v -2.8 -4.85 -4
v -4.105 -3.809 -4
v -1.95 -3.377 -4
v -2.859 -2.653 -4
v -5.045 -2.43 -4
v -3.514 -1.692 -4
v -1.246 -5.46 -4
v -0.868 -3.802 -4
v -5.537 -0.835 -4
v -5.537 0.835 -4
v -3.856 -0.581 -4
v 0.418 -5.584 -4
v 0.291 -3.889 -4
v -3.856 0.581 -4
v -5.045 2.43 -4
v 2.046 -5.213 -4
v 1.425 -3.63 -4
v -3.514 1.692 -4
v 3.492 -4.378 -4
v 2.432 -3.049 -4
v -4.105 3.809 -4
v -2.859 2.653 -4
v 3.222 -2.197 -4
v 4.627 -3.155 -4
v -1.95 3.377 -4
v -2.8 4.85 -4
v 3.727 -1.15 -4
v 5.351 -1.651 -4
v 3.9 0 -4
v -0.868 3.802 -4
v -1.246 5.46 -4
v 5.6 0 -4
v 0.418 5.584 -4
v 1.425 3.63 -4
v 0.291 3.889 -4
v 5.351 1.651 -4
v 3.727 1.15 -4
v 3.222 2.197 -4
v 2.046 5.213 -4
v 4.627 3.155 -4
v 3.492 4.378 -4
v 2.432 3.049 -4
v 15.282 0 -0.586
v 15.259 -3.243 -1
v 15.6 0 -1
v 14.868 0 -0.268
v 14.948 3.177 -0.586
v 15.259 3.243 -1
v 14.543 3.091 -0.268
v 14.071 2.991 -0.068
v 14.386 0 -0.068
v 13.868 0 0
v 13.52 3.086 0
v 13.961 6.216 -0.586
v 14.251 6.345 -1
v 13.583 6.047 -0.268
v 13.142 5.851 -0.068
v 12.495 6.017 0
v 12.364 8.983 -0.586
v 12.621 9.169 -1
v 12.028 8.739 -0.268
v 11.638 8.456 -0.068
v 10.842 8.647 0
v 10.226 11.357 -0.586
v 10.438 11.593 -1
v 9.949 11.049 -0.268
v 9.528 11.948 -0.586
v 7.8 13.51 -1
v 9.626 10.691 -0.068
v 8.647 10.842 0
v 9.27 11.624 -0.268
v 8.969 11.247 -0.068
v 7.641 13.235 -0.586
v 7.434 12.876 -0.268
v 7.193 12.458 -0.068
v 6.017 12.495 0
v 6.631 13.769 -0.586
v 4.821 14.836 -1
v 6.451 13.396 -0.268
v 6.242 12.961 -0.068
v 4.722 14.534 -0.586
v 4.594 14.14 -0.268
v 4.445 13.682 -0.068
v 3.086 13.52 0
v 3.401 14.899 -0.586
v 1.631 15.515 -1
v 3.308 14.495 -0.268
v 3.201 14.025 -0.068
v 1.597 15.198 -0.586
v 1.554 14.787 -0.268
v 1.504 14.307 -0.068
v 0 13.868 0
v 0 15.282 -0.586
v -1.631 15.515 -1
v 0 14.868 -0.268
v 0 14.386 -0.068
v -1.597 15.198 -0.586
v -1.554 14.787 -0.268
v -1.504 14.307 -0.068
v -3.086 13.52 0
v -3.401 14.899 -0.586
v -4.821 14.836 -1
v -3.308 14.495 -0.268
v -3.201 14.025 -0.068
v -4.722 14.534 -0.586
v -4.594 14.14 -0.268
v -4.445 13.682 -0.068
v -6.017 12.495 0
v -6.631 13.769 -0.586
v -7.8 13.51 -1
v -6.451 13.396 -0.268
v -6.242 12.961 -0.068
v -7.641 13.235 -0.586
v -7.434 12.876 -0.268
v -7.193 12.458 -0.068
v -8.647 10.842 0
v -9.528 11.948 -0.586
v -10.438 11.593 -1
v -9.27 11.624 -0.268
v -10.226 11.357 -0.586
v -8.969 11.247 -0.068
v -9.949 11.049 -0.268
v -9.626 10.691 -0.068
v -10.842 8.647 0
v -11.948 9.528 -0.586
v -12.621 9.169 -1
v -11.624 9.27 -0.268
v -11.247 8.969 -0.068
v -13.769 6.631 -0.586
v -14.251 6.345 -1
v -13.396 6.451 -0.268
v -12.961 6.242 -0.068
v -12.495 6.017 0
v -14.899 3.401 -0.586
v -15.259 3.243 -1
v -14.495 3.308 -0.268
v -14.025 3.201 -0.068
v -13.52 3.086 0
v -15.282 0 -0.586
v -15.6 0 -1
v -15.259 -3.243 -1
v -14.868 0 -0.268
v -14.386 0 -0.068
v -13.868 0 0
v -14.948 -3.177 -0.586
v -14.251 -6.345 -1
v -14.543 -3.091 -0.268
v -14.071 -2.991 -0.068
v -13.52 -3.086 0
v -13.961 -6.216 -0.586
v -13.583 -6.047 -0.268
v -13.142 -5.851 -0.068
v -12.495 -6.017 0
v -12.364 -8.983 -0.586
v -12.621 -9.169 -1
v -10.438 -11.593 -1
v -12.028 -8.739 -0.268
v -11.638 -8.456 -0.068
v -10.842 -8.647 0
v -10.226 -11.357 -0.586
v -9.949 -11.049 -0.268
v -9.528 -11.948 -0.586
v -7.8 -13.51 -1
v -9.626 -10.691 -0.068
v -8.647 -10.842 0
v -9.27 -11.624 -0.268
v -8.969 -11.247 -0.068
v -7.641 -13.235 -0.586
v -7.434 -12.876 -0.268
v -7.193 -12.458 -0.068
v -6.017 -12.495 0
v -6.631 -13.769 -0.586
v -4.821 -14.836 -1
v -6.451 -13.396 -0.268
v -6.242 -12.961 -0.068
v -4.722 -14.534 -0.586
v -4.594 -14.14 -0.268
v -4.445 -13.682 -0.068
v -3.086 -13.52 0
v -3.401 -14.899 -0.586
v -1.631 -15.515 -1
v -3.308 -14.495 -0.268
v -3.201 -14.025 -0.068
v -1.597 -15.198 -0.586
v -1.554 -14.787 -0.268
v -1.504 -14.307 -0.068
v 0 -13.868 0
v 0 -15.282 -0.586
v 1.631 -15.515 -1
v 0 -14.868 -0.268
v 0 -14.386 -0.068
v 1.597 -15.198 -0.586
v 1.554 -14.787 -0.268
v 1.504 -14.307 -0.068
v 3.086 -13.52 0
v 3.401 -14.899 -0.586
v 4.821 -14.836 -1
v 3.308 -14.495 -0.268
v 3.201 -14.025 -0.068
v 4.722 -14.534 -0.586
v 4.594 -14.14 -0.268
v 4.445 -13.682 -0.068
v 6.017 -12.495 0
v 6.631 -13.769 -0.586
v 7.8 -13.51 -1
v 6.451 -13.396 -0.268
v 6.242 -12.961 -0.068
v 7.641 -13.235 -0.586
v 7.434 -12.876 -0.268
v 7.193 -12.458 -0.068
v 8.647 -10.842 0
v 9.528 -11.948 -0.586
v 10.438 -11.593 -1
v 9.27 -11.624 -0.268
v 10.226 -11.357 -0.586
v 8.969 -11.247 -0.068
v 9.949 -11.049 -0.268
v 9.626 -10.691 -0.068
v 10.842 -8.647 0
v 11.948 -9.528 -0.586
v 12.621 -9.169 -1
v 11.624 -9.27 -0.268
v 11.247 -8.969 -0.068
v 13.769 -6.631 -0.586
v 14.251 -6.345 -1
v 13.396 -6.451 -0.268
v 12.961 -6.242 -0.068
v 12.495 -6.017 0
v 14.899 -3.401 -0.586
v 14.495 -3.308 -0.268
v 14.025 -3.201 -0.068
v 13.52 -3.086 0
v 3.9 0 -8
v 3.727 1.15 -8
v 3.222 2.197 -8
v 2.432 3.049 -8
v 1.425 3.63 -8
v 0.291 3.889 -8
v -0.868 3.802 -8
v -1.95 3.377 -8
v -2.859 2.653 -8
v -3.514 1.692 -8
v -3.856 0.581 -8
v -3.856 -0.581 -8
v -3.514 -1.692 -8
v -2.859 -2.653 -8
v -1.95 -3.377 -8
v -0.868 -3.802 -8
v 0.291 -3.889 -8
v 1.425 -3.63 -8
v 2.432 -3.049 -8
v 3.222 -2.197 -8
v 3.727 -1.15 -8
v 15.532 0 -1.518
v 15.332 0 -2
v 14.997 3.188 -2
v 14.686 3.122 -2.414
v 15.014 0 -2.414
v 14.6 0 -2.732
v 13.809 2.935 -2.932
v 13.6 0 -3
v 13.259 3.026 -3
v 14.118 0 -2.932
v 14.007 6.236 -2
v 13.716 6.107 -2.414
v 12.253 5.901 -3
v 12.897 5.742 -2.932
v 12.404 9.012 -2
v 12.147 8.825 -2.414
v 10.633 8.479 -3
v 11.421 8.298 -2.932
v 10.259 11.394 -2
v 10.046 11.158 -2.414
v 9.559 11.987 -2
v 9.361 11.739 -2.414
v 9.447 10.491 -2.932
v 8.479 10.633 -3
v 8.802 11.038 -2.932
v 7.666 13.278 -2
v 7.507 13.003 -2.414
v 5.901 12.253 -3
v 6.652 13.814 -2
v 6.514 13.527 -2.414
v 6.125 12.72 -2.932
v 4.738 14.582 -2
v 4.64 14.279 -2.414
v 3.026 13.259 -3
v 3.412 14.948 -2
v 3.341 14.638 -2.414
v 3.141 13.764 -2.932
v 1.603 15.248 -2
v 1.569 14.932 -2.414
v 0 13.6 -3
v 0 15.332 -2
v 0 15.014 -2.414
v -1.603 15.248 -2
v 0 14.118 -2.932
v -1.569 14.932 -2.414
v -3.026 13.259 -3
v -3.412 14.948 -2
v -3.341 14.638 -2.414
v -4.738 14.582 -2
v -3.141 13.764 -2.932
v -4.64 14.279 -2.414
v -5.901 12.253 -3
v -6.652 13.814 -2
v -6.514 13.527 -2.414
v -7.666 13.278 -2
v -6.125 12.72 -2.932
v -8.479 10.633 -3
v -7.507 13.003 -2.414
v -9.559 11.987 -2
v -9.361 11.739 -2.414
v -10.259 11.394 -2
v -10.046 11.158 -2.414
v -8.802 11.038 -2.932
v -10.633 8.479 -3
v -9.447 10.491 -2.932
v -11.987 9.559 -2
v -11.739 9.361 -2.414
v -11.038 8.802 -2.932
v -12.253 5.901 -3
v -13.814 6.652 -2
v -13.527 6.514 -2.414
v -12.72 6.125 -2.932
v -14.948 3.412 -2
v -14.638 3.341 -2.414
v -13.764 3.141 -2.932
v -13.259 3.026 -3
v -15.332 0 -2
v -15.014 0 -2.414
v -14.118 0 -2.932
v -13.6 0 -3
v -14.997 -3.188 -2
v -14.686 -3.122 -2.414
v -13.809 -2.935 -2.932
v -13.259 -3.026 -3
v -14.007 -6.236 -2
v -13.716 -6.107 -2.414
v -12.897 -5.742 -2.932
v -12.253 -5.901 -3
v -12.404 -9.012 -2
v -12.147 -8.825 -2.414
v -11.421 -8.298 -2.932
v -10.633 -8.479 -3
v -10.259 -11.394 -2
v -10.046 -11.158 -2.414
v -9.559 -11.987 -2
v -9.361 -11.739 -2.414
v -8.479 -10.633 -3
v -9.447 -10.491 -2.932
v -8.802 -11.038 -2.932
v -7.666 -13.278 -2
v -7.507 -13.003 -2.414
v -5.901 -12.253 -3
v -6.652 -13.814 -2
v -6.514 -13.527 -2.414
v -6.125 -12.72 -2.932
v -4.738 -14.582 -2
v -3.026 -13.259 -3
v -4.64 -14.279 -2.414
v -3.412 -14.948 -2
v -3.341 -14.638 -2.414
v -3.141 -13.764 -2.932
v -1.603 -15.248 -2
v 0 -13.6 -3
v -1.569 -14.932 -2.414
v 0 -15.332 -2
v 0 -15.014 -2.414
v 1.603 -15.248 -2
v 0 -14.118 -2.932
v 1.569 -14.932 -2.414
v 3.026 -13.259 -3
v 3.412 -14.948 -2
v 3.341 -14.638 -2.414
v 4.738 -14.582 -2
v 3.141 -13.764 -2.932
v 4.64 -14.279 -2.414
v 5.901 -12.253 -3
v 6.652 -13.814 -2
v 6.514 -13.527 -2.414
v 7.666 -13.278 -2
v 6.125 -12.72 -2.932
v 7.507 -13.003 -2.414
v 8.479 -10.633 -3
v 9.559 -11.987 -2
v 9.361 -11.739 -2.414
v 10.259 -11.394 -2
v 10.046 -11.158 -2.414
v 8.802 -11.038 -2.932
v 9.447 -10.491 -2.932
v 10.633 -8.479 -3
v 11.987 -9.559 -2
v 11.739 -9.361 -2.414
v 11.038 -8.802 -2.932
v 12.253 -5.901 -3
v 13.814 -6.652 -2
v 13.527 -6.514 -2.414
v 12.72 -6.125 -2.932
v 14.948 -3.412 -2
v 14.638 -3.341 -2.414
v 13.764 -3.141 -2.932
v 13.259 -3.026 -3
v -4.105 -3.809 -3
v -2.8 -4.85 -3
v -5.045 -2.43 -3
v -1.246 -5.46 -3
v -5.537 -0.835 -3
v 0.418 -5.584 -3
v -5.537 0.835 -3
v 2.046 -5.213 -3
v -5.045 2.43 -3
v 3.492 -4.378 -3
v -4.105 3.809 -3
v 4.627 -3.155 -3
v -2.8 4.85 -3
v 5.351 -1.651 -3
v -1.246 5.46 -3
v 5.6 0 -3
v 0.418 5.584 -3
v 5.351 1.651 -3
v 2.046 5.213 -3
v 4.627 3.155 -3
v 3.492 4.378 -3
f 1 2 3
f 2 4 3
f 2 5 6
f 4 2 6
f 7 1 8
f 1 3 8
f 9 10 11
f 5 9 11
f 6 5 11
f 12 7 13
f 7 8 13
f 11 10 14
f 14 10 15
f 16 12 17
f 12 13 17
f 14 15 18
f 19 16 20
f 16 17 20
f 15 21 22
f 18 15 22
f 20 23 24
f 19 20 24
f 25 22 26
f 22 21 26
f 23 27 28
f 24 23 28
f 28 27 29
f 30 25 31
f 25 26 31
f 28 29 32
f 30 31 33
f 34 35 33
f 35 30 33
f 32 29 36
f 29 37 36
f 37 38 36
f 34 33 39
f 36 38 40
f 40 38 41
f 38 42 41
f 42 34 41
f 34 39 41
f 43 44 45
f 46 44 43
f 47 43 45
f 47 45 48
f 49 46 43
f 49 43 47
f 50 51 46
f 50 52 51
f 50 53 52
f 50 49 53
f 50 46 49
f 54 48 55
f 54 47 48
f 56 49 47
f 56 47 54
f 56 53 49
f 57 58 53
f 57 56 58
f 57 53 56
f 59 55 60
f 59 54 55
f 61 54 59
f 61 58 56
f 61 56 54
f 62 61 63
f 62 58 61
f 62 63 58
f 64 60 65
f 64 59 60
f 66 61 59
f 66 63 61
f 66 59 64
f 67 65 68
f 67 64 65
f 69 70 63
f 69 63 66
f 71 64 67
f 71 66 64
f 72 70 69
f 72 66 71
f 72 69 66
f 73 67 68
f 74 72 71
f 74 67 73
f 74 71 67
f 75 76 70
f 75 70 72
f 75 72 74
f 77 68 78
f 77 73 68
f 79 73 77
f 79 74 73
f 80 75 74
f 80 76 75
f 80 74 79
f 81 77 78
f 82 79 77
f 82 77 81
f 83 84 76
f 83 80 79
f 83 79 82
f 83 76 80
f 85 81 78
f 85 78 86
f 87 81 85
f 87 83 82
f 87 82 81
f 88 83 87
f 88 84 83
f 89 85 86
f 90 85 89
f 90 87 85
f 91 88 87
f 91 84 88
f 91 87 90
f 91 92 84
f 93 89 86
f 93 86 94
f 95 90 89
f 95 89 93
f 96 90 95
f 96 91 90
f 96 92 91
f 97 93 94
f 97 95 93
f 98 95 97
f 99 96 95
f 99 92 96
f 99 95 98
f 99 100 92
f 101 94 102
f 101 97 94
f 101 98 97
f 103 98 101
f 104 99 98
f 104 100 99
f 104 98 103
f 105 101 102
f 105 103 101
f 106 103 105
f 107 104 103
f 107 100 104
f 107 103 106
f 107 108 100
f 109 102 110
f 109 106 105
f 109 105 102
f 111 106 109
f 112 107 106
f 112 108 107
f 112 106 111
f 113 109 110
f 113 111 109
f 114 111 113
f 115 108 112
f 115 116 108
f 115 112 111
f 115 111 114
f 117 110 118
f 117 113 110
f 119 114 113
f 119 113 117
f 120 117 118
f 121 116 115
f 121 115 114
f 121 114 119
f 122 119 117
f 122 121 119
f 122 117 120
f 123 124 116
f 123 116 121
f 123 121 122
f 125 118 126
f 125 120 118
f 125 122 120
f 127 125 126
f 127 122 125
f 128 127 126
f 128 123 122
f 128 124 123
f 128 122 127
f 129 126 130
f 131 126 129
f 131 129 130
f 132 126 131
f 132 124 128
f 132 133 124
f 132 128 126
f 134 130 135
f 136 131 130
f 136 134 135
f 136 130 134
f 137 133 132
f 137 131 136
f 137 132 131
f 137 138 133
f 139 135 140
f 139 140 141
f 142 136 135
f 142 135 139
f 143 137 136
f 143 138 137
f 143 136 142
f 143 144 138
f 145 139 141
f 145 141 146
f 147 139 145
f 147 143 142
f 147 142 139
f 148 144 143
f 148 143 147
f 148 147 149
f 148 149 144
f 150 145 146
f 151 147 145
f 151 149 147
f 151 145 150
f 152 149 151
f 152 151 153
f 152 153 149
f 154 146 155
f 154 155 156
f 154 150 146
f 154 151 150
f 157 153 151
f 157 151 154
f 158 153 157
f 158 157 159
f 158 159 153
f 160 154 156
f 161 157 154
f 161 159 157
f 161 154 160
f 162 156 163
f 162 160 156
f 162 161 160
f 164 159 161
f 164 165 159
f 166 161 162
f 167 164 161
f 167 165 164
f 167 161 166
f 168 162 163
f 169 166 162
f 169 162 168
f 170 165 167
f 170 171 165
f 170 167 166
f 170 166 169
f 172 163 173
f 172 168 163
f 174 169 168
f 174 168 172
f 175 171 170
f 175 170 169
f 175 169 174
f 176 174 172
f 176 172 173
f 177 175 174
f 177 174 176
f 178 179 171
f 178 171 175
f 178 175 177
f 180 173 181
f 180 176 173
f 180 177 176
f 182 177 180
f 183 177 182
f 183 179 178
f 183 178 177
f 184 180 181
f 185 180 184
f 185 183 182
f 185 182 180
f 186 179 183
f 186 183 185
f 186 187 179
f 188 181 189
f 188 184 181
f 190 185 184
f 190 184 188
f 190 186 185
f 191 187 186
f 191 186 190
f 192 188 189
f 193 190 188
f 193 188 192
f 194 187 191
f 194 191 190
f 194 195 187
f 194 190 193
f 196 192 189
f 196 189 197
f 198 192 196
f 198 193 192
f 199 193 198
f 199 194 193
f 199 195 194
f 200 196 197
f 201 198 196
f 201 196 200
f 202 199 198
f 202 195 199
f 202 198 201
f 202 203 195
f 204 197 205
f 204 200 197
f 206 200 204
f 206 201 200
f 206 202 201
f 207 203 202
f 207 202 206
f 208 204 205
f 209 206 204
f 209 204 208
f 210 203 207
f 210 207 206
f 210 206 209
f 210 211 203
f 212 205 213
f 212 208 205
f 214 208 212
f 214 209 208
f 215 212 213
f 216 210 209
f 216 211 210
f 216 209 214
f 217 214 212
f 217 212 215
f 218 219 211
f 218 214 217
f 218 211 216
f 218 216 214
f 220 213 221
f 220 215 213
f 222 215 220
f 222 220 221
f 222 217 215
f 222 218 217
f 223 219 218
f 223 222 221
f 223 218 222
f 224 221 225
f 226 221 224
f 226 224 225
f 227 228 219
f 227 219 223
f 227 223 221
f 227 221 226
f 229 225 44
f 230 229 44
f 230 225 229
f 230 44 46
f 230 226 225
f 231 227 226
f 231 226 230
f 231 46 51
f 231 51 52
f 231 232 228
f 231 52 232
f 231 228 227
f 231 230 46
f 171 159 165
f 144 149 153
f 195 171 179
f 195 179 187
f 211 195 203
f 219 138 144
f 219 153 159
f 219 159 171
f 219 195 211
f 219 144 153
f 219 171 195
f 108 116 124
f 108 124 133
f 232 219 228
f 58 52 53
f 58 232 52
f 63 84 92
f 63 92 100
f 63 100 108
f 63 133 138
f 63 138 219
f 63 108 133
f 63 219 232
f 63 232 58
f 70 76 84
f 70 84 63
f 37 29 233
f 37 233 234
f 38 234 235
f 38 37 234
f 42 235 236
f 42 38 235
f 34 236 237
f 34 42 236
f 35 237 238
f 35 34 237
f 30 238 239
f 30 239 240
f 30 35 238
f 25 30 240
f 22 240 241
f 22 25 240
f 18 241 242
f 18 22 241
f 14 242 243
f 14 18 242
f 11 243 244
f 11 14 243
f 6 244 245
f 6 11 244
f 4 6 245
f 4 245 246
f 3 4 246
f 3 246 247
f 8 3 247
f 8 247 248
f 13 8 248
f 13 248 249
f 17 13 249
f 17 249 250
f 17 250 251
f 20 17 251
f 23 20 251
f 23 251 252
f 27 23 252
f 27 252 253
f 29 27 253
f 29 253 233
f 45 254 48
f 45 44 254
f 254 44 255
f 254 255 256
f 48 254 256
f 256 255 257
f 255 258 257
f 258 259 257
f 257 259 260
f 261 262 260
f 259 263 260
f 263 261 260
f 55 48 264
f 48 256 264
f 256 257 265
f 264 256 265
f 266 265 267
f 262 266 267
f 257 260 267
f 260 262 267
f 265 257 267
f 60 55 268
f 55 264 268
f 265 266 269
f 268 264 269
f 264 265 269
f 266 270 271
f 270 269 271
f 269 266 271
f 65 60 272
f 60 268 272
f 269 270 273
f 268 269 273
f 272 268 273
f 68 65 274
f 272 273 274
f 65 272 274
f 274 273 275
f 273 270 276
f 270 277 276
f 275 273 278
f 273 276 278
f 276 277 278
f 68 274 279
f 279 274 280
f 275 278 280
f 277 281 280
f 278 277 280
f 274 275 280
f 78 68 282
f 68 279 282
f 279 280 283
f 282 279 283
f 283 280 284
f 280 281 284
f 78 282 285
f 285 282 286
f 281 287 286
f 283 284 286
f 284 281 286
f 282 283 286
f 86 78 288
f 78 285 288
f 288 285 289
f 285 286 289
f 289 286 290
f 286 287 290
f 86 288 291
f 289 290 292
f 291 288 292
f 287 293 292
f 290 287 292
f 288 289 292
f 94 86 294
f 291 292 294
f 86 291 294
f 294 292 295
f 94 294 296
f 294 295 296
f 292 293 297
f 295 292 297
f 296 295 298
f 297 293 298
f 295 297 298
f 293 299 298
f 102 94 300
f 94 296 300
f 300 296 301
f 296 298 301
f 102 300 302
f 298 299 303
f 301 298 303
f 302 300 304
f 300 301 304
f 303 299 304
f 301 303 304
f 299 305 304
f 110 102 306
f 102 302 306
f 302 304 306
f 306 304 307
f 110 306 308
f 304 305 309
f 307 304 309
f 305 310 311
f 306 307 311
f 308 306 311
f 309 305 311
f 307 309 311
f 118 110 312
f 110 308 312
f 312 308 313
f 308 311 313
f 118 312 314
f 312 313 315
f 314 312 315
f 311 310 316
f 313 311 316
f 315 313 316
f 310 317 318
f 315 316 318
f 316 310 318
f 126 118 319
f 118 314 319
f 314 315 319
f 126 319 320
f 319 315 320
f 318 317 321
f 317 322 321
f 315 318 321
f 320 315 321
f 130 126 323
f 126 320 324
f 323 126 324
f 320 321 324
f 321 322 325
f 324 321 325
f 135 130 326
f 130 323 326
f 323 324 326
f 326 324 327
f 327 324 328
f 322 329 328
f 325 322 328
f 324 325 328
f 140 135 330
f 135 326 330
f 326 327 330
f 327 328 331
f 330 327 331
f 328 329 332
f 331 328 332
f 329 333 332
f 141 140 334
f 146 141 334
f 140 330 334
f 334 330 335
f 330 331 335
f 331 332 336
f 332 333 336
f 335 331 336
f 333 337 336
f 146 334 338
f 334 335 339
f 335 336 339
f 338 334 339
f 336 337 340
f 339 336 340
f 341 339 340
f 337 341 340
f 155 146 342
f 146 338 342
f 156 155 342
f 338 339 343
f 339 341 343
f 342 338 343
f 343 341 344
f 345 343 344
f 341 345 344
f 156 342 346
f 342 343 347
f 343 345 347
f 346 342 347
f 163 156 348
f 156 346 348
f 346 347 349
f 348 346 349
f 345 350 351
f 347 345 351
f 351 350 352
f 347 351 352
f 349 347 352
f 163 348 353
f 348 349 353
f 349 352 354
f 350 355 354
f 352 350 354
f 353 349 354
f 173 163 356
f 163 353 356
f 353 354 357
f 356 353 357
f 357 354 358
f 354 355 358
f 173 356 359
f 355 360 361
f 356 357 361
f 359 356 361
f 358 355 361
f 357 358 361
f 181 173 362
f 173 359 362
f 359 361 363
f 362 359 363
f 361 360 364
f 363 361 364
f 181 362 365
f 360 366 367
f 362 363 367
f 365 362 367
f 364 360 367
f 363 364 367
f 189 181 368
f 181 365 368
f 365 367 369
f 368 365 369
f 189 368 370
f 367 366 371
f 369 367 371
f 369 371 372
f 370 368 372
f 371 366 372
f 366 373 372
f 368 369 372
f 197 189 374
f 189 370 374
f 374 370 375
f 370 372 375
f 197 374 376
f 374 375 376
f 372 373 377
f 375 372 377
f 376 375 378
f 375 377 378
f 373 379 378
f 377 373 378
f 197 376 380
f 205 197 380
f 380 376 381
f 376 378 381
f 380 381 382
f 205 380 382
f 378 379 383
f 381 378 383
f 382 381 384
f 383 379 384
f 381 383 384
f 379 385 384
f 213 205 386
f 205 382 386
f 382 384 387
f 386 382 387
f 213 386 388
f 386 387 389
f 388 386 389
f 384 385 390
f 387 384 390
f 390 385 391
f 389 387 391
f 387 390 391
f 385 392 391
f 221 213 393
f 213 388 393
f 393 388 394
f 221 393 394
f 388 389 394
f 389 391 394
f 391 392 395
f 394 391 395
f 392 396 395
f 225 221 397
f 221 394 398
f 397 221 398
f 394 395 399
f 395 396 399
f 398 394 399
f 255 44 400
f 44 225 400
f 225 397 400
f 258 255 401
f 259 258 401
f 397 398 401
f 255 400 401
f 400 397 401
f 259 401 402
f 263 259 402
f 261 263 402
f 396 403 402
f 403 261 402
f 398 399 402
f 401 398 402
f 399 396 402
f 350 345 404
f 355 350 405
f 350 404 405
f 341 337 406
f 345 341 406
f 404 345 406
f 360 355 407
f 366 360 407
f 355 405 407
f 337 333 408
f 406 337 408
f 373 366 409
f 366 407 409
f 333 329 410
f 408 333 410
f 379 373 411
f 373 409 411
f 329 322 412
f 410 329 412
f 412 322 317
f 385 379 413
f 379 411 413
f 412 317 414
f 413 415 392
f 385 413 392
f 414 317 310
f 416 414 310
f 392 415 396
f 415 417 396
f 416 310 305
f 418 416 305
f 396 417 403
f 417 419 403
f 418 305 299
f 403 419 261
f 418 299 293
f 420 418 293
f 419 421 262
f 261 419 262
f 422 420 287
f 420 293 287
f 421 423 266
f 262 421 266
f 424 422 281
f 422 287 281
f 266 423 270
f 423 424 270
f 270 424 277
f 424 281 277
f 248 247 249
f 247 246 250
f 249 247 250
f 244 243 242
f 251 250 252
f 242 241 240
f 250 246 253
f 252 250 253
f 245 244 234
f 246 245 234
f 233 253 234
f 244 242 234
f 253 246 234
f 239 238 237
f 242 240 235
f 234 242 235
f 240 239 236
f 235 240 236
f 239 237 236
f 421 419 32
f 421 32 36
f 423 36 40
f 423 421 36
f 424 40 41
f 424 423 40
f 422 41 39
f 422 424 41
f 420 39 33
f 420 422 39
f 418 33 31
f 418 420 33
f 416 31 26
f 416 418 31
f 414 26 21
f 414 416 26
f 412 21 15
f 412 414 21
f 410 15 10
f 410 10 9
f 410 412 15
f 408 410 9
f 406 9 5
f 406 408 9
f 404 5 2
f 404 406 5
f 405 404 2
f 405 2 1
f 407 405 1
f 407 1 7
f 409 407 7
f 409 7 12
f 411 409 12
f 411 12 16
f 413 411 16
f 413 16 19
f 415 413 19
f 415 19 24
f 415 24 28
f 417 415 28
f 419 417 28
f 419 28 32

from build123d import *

# Parameters (mm, degrees)
F0_R     = 15.6
F0_R_2   = 5.6
F0_R_3   = 3.9
F1_DEPTH = 3
F2_DEPTH = 4
F3_DEPTH = 8
F4_R     = 2


# Not quite as in the source:
# - a fillet or chamfer that OpenCascade refuses, or shapes differently, is made with other operations: its cross-section is extruded or revolved along the edge and cut away or added


with BuildPart() as f1:
    # F0 (on Top) → F1 (new body)
    with BuildSketch(Plane.XY):
        Circle(F0_R)
        Circle(F0_R_2, mode=Mode.SUBTRACT)
        Circle(F0_R_2)
        Circle(F0_R_3, mode=Mode.SUBTRACT)
        Circle(F0_R_3)
    extrude(amount=-F1_DEPTH)

    # F0 (on Top) → F2 (join)
    with BuildSketch(Plane.XY):
        Circle(F0_R_2)
        Circle(F0_R_3, mode=Mode.SUBTRACT)
        Circle(F0_R_3)
    extrude(amount=-F2_DEPTH)

    # F0 (on Top) → F3 (join)
    with BuildSketch(Plane.XY):
        Circle(F0_R_3)
    extrude(amount=-F3_DEPTH)

    # F4
    f4_edges = [f1.edges().sort_by_distance(p)[0] for p in [
        (-15.6, 0, -3),
    ]]
    fillet(f4_edges, radius=F4_R)

    # F5: fillet of radius 2 on 1 edges, made by hand

    # F5_s1 → F5_t2 (revolve, cut)
    with BuildSketch(Plane.XZ):
        with BuildLine():
            ThreePointArc((15.6, -1), (14.8679491924, -0.2679491924), (13.8679491924, 0))
            Line((13.8679491924, 0), (15.6, 0))
            Line((15.6, 0), (15.6, -1))
        make_face()
    revolve(axis=Axis((0, 0, 0), (0, 0, 1)), mode=Mode.SUBTRACT)


solid = f1.part
